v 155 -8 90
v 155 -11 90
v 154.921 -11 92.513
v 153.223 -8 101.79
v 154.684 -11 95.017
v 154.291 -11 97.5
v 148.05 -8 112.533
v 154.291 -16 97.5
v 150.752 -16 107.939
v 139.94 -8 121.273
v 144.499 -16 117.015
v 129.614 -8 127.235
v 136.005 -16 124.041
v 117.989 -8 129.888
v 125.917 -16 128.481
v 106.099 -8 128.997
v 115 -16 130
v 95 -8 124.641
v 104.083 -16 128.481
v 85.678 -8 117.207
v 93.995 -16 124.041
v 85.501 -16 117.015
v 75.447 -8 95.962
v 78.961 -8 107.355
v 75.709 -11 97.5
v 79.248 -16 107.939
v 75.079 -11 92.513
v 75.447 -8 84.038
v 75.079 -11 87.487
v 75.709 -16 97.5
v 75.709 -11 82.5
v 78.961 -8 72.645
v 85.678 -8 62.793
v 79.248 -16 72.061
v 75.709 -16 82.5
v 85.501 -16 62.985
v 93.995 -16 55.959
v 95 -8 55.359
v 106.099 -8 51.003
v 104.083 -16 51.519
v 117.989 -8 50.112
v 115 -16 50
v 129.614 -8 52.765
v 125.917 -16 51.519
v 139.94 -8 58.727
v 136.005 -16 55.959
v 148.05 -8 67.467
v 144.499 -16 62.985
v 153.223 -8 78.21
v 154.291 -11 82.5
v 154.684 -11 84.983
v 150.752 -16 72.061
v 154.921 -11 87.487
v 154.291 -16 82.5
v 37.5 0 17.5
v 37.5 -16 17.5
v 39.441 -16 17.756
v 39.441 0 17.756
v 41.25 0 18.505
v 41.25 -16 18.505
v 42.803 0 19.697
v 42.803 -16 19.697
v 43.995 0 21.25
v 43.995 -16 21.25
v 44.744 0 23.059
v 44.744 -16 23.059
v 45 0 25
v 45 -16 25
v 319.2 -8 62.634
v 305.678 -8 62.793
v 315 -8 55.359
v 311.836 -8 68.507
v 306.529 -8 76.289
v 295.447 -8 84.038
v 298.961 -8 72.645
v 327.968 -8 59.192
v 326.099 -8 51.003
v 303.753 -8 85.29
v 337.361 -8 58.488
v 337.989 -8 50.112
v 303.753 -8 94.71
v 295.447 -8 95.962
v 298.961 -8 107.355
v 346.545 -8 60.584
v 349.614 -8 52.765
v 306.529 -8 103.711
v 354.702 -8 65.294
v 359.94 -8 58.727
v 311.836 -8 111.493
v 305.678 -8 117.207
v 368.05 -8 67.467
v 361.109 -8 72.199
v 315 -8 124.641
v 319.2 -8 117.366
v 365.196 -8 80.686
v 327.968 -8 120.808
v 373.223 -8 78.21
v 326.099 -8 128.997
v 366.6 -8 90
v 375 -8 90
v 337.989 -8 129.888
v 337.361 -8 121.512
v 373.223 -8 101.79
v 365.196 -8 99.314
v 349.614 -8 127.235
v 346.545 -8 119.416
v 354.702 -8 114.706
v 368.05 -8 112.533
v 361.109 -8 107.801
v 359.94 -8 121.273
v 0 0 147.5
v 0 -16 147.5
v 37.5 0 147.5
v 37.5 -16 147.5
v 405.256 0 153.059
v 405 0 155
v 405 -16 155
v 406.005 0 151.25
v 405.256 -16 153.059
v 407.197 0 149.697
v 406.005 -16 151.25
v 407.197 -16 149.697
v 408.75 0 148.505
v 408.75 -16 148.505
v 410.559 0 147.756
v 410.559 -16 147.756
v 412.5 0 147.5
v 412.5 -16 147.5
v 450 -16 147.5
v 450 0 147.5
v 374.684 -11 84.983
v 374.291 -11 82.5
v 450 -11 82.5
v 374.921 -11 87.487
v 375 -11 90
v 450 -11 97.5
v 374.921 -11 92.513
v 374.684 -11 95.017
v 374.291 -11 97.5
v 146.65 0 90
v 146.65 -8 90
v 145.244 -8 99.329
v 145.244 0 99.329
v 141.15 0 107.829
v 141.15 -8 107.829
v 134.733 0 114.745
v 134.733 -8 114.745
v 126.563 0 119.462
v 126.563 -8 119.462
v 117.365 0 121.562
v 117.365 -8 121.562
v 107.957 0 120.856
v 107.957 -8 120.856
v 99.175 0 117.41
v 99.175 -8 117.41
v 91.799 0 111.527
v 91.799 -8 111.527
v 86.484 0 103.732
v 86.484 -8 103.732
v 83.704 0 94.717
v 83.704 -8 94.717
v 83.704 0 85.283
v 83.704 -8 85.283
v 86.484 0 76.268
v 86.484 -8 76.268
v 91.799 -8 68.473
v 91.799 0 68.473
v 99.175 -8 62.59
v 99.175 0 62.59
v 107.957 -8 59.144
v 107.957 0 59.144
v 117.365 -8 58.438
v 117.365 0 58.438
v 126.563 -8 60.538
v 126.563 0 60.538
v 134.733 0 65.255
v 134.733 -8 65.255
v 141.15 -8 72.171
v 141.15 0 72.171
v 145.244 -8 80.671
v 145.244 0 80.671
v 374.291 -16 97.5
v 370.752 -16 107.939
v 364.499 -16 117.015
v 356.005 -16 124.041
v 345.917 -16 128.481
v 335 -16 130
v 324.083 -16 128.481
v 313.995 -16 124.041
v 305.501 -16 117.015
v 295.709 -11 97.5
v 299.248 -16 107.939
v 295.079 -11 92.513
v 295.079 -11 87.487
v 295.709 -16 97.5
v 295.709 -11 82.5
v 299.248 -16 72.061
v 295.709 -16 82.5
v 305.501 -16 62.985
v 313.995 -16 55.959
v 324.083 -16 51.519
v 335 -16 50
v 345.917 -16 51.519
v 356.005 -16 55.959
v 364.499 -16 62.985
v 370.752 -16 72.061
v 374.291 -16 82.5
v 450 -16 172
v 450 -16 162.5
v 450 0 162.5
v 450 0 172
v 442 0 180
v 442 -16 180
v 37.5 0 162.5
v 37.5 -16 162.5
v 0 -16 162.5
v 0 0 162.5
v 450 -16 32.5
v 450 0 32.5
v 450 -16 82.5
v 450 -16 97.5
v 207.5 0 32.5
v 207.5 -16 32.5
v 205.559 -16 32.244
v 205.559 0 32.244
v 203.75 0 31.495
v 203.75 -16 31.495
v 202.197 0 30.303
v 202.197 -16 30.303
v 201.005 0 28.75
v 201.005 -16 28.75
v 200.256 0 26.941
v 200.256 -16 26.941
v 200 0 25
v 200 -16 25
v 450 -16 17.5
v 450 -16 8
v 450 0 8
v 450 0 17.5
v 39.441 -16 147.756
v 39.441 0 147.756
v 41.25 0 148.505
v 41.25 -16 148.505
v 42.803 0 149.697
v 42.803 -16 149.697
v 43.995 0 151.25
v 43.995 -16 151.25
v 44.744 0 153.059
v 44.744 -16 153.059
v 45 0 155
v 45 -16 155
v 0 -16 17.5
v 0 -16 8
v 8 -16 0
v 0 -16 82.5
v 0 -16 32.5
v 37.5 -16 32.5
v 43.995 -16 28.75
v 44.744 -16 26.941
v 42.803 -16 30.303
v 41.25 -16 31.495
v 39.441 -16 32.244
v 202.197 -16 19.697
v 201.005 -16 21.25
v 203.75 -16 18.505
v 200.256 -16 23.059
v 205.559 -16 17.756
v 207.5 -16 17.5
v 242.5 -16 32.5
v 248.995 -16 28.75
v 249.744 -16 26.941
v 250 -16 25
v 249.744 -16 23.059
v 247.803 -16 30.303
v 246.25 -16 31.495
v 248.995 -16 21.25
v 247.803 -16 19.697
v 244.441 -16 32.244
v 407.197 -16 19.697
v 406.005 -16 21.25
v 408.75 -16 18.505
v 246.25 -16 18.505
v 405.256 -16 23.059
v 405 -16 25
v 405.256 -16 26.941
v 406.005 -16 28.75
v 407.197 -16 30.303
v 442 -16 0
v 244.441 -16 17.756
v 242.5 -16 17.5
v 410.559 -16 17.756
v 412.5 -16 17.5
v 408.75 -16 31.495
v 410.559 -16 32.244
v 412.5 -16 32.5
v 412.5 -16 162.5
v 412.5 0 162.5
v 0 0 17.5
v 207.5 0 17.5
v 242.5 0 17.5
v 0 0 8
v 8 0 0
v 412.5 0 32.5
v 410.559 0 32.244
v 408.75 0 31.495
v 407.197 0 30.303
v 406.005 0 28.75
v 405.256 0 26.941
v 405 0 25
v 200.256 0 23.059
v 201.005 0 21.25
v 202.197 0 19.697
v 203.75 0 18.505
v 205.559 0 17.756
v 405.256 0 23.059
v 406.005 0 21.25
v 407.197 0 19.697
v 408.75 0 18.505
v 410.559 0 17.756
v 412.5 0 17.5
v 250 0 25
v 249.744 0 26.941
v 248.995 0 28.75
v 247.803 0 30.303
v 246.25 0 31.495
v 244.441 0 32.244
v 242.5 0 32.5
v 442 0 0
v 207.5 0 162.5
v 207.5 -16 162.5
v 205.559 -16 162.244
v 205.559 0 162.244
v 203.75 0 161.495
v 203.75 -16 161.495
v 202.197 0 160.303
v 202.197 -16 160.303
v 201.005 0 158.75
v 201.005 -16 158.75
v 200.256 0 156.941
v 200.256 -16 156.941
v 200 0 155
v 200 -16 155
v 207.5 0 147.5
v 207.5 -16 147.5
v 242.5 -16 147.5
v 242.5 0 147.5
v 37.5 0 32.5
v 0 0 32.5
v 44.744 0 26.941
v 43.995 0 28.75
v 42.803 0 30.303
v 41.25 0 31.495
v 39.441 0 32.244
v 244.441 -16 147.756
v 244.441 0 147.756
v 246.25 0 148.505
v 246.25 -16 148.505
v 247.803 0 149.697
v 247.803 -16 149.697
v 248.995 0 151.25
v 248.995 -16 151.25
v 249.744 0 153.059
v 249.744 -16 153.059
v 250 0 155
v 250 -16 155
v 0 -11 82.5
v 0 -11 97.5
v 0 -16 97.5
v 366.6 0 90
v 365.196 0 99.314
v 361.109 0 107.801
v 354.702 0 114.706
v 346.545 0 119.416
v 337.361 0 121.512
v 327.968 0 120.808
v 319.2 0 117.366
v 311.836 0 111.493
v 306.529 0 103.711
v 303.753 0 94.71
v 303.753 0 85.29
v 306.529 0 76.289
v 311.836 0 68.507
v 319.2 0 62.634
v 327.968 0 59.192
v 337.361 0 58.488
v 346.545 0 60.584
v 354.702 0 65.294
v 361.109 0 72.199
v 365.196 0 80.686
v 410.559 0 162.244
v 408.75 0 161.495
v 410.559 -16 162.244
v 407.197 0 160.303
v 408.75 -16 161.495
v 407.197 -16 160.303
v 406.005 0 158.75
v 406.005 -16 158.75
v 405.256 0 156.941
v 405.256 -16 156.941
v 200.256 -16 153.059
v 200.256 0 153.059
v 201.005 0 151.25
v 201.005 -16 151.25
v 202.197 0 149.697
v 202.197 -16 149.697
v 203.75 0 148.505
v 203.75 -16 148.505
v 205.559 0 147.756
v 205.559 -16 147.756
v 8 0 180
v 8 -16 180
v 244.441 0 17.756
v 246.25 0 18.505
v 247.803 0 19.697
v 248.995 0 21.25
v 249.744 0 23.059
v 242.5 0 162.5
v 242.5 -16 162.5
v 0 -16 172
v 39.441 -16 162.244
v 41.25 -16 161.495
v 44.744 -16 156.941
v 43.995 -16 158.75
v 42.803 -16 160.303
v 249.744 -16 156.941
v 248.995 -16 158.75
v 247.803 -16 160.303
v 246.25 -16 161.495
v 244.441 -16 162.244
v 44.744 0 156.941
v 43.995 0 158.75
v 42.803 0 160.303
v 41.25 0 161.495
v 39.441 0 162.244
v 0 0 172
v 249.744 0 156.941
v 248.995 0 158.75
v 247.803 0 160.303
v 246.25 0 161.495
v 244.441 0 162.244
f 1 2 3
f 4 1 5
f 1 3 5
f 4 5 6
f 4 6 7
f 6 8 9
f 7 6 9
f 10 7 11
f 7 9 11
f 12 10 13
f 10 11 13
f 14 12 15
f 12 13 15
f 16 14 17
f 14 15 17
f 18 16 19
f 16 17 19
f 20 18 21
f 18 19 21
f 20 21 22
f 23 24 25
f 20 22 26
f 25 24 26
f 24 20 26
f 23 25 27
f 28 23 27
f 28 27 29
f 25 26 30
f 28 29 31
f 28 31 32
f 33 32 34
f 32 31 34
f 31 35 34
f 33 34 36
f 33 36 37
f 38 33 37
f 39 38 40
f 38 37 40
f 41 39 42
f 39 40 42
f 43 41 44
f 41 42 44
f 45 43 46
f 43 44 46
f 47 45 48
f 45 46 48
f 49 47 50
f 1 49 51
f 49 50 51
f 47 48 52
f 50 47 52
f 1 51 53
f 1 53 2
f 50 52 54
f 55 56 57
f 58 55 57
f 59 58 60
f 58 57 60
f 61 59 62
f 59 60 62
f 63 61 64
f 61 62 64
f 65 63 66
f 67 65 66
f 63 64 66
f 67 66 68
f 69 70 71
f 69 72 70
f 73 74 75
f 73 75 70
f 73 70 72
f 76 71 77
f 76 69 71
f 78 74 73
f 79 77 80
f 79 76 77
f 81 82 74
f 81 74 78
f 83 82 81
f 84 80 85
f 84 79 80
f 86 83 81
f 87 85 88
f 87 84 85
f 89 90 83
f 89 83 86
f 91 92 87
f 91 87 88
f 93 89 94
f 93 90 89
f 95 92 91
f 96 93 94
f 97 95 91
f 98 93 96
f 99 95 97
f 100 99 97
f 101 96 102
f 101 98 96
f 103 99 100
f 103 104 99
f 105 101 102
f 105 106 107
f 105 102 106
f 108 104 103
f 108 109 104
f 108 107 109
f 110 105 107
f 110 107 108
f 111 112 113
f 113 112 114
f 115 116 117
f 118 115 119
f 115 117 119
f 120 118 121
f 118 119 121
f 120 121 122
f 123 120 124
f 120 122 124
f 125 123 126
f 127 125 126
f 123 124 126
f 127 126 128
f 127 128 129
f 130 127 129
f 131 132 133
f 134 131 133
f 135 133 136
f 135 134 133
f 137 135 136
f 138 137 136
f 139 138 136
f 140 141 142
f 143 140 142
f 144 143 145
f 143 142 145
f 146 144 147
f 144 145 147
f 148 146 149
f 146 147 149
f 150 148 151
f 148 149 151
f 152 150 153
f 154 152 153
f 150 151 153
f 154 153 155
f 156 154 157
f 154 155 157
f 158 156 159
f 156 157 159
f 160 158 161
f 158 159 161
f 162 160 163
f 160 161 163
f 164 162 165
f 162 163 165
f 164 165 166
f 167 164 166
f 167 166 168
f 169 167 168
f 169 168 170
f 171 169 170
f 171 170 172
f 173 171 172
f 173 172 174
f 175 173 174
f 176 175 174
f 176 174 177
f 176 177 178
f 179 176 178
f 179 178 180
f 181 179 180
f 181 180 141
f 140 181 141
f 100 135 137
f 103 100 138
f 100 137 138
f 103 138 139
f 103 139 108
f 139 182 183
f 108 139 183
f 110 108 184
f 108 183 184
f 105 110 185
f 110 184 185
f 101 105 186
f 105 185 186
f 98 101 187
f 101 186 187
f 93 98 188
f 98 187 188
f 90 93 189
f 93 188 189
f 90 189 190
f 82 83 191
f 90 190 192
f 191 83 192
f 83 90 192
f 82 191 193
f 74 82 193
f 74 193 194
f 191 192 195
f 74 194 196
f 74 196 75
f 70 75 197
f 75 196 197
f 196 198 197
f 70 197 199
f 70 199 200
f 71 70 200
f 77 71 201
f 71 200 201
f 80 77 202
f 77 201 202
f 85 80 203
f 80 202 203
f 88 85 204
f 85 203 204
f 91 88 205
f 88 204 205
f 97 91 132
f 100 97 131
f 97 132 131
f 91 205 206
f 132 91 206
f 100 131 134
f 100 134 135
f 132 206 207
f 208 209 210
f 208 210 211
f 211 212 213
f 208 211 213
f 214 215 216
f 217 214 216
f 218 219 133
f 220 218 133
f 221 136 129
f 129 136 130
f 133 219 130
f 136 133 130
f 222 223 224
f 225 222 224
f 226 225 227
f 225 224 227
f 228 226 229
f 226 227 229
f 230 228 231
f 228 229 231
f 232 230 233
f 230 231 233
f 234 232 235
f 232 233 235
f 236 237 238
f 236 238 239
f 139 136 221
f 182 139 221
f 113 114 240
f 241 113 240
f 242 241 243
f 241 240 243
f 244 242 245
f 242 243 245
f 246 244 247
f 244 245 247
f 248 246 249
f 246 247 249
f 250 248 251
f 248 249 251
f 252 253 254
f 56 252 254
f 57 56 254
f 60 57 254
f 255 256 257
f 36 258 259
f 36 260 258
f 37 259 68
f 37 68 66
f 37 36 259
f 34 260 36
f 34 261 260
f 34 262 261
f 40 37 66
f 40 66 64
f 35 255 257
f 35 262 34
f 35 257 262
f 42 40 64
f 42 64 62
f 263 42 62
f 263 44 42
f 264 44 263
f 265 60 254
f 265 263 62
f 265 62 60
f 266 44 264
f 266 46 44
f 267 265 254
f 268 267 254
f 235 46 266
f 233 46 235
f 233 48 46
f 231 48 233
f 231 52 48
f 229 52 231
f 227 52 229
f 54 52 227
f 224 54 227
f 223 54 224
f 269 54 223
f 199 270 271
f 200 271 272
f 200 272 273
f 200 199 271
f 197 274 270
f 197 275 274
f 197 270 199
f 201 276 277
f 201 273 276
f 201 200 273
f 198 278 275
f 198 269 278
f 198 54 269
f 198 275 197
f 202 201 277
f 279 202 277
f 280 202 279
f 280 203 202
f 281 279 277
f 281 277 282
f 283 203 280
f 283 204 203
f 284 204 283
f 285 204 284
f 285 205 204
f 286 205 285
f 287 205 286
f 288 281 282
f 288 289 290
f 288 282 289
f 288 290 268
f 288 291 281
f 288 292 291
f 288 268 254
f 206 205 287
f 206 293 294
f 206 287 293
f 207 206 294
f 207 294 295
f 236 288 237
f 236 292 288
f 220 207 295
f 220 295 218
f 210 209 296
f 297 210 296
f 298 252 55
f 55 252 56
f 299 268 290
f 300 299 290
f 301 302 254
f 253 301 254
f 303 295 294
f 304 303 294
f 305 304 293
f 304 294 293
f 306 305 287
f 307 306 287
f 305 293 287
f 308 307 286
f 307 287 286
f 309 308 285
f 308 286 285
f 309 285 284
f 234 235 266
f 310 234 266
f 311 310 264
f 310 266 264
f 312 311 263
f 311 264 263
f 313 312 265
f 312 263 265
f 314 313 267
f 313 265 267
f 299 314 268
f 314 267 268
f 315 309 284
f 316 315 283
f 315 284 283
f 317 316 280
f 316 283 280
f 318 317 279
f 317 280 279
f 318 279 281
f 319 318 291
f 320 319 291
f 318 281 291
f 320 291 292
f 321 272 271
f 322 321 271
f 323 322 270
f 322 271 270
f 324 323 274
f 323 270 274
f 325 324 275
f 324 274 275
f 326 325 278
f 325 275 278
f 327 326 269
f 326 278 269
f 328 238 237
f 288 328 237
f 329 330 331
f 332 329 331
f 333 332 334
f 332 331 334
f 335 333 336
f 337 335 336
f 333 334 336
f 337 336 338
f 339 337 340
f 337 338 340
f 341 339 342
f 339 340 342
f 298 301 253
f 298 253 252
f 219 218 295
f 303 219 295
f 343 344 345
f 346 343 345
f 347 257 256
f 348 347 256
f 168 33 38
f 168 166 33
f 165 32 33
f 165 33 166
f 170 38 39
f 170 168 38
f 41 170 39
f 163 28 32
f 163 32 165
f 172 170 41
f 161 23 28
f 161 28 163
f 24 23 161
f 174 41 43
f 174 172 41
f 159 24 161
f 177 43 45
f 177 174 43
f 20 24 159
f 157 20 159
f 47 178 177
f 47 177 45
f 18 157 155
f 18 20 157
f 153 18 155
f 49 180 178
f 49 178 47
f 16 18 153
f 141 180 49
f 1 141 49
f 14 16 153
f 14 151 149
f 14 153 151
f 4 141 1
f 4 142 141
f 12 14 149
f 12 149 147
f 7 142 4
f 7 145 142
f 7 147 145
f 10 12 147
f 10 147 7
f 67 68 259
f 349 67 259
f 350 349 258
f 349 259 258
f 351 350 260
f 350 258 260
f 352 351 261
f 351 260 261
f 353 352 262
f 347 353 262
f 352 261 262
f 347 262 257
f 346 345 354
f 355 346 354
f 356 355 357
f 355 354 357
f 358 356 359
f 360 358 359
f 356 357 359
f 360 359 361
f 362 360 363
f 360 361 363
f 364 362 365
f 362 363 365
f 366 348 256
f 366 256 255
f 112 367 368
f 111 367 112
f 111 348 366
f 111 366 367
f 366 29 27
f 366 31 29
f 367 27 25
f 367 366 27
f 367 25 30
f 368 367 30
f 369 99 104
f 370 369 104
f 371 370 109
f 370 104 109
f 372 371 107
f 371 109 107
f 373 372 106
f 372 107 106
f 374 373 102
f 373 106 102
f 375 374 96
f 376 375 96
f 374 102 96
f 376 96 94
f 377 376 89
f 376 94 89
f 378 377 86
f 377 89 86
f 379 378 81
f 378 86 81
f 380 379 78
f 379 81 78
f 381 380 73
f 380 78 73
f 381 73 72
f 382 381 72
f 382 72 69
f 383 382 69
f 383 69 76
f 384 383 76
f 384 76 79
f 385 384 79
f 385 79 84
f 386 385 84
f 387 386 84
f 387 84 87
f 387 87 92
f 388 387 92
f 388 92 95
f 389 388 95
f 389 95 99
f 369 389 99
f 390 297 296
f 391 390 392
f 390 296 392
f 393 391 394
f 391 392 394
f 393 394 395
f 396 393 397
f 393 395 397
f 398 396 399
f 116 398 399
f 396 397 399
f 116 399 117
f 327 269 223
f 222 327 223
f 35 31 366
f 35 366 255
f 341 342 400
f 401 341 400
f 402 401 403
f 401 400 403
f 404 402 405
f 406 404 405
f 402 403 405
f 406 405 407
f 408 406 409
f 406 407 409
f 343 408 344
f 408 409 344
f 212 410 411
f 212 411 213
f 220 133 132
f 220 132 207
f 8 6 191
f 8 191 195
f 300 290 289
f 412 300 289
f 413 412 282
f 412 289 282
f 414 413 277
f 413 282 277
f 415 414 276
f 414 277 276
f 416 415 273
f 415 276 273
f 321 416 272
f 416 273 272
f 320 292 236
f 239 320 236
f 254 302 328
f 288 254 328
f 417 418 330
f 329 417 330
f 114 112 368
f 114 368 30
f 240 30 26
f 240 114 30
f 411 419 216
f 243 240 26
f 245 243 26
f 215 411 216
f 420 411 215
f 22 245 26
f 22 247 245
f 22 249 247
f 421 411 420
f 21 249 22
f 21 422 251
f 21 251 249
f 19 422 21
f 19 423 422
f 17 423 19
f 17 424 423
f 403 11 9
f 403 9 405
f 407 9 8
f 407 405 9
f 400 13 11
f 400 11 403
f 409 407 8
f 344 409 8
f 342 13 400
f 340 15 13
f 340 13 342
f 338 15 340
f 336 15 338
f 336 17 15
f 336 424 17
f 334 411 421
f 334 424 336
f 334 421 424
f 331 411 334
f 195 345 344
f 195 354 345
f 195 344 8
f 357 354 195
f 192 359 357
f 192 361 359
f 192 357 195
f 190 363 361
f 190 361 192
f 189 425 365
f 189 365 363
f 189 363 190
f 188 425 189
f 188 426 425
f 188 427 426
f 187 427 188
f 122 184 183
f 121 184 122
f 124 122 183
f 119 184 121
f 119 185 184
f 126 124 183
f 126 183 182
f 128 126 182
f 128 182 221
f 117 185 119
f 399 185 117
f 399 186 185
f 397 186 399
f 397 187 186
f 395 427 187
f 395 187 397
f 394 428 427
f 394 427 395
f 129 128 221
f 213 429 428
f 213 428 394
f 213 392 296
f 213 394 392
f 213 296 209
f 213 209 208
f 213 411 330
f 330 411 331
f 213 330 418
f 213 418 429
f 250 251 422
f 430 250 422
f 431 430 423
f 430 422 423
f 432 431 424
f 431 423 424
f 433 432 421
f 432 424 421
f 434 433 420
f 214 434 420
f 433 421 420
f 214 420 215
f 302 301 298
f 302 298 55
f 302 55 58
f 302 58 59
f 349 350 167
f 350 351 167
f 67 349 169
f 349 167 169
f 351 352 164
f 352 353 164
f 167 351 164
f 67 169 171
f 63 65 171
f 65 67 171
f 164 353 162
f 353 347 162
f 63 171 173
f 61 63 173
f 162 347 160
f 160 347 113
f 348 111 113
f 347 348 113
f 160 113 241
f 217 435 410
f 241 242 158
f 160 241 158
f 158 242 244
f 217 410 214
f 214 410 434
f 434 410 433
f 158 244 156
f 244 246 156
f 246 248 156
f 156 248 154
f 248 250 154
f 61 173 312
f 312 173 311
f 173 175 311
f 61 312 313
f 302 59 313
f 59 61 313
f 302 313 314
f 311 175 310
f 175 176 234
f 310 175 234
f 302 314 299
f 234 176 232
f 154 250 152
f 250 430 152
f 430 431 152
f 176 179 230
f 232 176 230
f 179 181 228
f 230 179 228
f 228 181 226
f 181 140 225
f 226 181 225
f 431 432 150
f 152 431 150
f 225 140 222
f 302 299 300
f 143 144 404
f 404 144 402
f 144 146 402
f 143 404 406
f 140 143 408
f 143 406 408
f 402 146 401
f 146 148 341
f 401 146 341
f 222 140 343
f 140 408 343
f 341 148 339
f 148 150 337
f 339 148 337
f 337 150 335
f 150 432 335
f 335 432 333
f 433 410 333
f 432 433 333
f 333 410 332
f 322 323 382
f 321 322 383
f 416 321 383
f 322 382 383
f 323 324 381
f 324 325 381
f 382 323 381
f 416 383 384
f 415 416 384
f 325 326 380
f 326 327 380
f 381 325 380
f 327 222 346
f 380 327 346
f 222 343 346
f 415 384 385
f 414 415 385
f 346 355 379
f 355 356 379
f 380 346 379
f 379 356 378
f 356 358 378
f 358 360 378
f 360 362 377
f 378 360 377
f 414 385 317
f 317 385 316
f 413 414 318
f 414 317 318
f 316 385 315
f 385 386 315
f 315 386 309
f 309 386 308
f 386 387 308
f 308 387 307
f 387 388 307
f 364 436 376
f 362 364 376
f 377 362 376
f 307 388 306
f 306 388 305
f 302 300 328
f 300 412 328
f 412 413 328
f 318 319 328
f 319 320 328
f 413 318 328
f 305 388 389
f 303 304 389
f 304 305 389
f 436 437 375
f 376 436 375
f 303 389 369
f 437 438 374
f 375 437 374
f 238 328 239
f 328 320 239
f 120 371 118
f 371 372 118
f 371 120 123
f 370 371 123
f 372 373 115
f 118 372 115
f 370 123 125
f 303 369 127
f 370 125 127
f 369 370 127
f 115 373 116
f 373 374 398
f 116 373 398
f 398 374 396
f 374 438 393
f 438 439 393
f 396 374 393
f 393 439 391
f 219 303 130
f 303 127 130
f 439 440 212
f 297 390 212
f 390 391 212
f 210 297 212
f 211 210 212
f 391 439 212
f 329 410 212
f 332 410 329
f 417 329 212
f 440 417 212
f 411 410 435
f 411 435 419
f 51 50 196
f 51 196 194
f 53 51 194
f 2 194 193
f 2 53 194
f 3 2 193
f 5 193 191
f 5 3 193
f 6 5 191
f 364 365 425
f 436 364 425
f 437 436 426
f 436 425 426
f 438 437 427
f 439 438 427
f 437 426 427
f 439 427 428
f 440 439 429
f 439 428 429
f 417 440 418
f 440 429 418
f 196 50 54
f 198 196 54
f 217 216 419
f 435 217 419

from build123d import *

# Parameters (mm, degrees)
F0_W      = 450
F0_H      = 180
F1_DEPTH  = 16
F2_SIZE   = 8
F3_R      = 31.6
F3_R_2    = 31.65
F4_DEPTH  = 16.001
F6_DEPTH  = 16.001
F7_R      = 40
F7_R_2    = 31.65
F8_DEPTH  = 8
F9_R      = 40
F10_DEPTH = 8
F11_W     = 10
F11_H     = 15
F12_DEPTH = 450.001


with BuildPart() as f1:
    # F0 (on Front) → F1 (new body)
    with BuildSketch(Plane.XZ):
        with Locations((225, 90)):
            Rectangle(F0_W, F0_H)
    extrude(amount=F1_DEPTH)

    # F2
    f2_edges = [f1.edges().sort_by_distance(p)[0] for p in [
        (450, -8, 180),
        (450, -8, 0),
        (0, -8, 180),
        (0, -8, 0),
    ]]
    chamfer(f2_edges, length=F2_SIZE)

    # F3 (on face) → F4 (cut, through all)
    with BuildSketch(Plane.XZ.offset(16)):
        with Locations((335, 90)):
            Circle(F3_R)
        with Locations((115, 90)):
            Circle(F3_R_2)
    extrude(amount=-F4_DEPTH, mode=Mode.SUBTRACT)

    # F5 (on face) → F6 (cut, through all)
    with BuildSketch(Plane.XZ.offset(16)):
        with BuildLine():
            Line((207.5, 147.5), (242.5, 147.5))
            ThreePointArc((242.5, 147.5), (247.803301, 149.696699), (250, 155))
            ThreePointArc((250, 155), (247.803301, 160.303301), (242.5, 162.5))
            Line((242.5, 162.5), (207.5, 162.5))
            ThreePointArc((207.5, 162.5), (202.196699, 160.303301), (200, 155))
            ThreePointArc((200, 155), (202.196699, 149.696699), (207.5, 147.5))
        make_face()
        with BuildLine():
            Line((-68.917155, 147.5), (37.5, 147.5))
            ThreePointArc((37.5, 147.5), (42.803301, 149.696699), (45, 155))
            ThreePointArc((45, 155), (42.803301, 160.303301), (37.5, 162.5))
            Line((37.5, 162.5), (-68.917155, 162.5))
            Line((-68.917155, 162.5), (-68.917155, 147.5))
        make_face()
        with BuildLine():
            Line((455.818099, 147.5), (455.818099, 162.5))
            Line((455.818099, 162.5), (412.5, 162.5))
            ThreePointArc((412.5, 162.5), (407.196699, 160.303301), (405, 155))
            ThreePointArc((405, 155), (407.196699, 149.696699), (412.5, 147.5))
            Line((412.5, 147.5), (455.818099, 147.5))
        make_face()
        with BuildLine():
            ThreePointArc((207.5, 32.5), (202.196699, 30.303301), (200, 25))
            ThreePointArc((200, 25), (202.196699, 19.696699), (207.5, 17.5))
            Line((207.5, 17.5), (242.5, 17.5))
            ThreePointArc((242.5, 17.5), (247.803301, 19.696699), (250, 25))
            ThreePointArc((250, 25), (247.803301, 30.303301), (242.5, 32.5))
            Line((242.5, 32.5), (207.5, 32.5))
        make_face()
        with BuildLine():
            ThreePointArc((412.5, 32.5), (407.196699, 30.303301), (405, 25))
            ThreePointArc((405, 25), (407.196699, 19.696699), (412.5, 17.5))
            Line((412.5, 17.5), (455.818099, 17.5))
            Line((455.818099, 17.5), (455.818099, 32.5))
            Line((455.818099, 32.5), (412.5, 32.5))
        make_face()
        with BuildLine():
            ThreePointArc((37.5, 17.5), (42.803301, 19.696699), (45, 25))
            ThreePointArc((45, 25), (42.803301, 30.303301), (37.5, 32.5))
            Line((37.5, 32.5), (-68.917155, 32.5))
            Line((-68.917155, 32.5), (-68.917155, 17.5))
            Line((-68.917155, 17.5), (37.5, 17.5))
        make_face()
    extrude(amount=-F6_DEPTH, mode=Mode.SUBTRACT)

    # F7 (on face) → F8 (cut)
    with BuildSketch(Plane.XZ.offset(16)):
        with Locations((115, 90)):
            Circle(F7_R)
        with Locations((115, 90)):
            Circle(F7_R_2, mode=Mode.SUBTRACT)
    extrude(amount=-F8_DEPTH, mode=Mode.SUBTRACT)

    # F9 (on face) → F10 (cut)
    with BuildSketch(Plane.XZ.offset(16)):
        with Locations((335, 90)):
            Circle(F9_R)
    extrude(amount=-F10_DEPTH, mode=Mode.SUBTRACT)

    # F11 (on face) → F12 (cut, through all)
    with BuildSketch(Plane(origin=(0, 0, 0), x_dir=(0, -1, 0), z_dir=(-1, 0, 0))):
        with Locations((16, 90)):
            Rectangle(F11_W, F11_H)
    extrude(amount=-F12_DEPTH, mode=Mode.SUBTRACT)


solid = f1.part
